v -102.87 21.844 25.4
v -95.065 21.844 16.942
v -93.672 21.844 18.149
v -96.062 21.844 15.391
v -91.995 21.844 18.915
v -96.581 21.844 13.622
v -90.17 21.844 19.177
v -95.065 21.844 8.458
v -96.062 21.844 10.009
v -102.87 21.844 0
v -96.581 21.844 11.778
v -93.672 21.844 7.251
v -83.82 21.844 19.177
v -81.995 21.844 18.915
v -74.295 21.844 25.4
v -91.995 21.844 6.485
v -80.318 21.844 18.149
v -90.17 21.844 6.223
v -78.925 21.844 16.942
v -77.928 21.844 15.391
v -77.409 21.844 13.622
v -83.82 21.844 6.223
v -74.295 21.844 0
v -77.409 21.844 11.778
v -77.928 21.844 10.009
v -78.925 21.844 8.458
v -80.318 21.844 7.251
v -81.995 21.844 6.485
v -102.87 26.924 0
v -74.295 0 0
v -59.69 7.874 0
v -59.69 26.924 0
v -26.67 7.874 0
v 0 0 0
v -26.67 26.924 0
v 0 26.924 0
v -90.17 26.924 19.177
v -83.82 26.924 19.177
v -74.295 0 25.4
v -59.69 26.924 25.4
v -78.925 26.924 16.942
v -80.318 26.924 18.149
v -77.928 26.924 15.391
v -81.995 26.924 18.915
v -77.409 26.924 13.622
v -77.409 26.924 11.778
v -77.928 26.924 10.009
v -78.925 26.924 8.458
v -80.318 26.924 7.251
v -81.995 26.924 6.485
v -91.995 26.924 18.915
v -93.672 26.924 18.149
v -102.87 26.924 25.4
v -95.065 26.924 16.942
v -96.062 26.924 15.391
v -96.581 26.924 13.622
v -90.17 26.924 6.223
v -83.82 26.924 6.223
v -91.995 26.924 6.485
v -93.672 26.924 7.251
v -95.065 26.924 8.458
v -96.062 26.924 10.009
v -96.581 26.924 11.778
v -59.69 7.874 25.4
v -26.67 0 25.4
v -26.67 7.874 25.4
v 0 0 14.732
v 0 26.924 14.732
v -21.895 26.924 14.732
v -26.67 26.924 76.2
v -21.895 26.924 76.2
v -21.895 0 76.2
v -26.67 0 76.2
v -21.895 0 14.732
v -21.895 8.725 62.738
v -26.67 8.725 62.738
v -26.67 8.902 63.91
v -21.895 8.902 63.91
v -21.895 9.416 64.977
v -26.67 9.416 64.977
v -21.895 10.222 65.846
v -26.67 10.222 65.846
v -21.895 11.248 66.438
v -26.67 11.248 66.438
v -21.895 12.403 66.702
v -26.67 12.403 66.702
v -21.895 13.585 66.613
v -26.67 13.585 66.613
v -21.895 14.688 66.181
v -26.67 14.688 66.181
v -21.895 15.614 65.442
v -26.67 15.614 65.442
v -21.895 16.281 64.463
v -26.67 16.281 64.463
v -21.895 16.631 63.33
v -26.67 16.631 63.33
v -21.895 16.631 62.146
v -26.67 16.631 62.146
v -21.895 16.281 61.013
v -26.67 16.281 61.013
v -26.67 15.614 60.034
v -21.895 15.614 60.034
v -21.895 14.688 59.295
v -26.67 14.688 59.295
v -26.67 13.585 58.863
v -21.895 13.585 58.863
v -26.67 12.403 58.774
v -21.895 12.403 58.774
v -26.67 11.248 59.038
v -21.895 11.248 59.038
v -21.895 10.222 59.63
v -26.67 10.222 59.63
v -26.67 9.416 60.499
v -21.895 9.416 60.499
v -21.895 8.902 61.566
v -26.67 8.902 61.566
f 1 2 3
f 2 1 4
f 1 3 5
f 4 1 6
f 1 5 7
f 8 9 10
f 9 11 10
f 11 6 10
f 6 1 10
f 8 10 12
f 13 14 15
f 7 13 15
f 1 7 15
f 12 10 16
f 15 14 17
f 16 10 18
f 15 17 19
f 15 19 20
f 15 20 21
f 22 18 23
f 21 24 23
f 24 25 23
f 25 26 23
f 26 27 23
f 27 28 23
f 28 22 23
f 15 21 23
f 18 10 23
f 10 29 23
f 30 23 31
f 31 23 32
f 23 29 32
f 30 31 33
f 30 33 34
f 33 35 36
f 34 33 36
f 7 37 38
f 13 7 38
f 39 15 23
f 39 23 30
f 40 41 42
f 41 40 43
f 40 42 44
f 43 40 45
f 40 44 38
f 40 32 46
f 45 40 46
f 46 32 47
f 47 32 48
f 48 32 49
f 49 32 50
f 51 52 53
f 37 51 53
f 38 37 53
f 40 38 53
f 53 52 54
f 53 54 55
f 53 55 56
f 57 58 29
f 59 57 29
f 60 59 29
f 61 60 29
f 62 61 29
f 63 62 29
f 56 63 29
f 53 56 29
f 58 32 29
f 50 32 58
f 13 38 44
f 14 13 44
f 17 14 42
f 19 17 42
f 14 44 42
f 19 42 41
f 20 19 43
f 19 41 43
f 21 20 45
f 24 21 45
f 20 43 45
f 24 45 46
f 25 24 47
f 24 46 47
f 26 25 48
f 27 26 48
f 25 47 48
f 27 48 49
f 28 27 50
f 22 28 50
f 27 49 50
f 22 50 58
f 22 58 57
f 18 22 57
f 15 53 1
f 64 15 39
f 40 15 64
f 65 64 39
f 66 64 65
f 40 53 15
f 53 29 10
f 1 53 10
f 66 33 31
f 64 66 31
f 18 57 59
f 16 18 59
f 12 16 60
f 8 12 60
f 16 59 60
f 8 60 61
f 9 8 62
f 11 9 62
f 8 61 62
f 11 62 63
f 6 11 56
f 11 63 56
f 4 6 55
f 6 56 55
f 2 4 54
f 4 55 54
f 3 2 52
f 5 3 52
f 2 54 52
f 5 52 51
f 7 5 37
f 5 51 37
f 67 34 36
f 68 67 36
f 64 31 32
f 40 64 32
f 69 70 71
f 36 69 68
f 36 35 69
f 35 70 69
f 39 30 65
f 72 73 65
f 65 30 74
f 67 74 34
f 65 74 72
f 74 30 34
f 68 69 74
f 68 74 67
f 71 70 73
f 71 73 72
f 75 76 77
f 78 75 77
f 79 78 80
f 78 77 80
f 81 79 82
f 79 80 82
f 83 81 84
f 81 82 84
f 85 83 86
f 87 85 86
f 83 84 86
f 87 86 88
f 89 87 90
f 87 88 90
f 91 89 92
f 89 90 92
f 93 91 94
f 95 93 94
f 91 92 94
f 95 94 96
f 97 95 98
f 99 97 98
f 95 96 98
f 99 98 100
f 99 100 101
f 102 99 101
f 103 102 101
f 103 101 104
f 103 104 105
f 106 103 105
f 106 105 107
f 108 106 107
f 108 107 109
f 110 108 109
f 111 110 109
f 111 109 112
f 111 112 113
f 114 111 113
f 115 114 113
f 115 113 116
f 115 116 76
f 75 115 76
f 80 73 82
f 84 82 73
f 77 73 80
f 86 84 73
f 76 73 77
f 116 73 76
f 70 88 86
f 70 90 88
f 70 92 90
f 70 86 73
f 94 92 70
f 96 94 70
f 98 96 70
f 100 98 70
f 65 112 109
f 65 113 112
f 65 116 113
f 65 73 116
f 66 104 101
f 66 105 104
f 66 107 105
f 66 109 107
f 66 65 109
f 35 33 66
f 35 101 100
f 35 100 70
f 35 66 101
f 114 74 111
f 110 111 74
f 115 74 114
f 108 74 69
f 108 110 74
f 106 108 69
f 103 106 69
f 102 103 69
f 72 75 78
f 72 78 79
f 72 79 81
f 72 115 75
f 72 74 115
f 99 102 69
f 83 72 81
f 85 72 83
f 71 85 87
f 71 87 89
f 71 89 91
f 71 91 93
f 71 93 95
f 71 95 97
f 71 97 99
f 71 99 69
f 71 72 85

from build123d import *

# Parameters (mm, degrees)
F1_DEPTH  = 25.4
F3_DEPTH  = 127
F4_W      = 4.7752
F4_H      = 26.924
F5_DEPTH  = 50.8
F6_R      = 3.9751
F7_DEPTH  = 25.4
F8_W      = 26.924
F8_H      = 57.4802
F9_DEPTH  = 25.4
F10_W     = 21.8948
F10_H     = 26.924
F11_DEPTH = 3.9878


with BuildPart() as f1:
    # F0 (on Top) → F1 (new body)
    with BuildSketch(Plane.XY):
        Polygon((-74.295, 0), (0, 0), (0, 26.924), (-26.67, 26.924), (-26.67, 7.874), (-59.69, 7.874), (-59.69, 26.924), (-102.87, 26.924), (-102.87, 21.844), (-74.295, 21.844), align=None)
    extrude(amount=F1_DEPTH)

    # F2 (on face) → F3 (cut)
    with BuildSketch(Plane(origin=(0, 26.924, 0), x_dir=(-1, 0, 0), z_dir=(0, 1, 0))):
        with BuildLine():
            Line((90.17, 19.177), (90.17, 6.223))
            ThreePointArc((90.17, 6.223), (96.647, 12.7), (90.17, 19.177))
        make_face()
        with BuildLine():
            Line((83.82, 6.223), (90.17, 6.223))
            Line((90.17, 6.223), (90.17, 19.177))
            Line((90.17, 19.177), (83.82, 19.177))
            ThreePointArc((83.82, 19.177), (77.343, 12.7), (83.82, 6.223))
        make_face()
    extrude(amount=-F3_DEPTH, mode=Mode.SUBTRACT)

    # F4 (on face) → F5 (join)
    with BuildSketch(Plane.XY.offset(25.4)):
        with Locations((-24.2824, 13.462)):
            Rectangle(F4_W, F4_H)
    extrude(amount=F5_DEPTH)

    # F6 (on face) → F7 (cut)
    with BuildSketch(Plane(origin=(-26.67, 0, 0), x_dir=(0, -1, 0), z_dir=(-1, 0, 0))):
        with Locations((-12.7, 62.738)):
            Circle(F6_R)
    extrude(amount=-F7_DEPTH, mode=Mode.SUBTRACT)

    # F8 (on face) → F9 (cut)
    with BuildSketch(Plane.YZ.offset(-21.8948)):
        with Locations((13.462, 47.4599)):
            Rectangle(F8_W, F8_H)
    extrude(amount=F9_DEPTH, mode=Mode.SUBTRACT)

    # F10 (on face) → F11 (cut)
    with BuildSketch(Plane.XY.offset(18.7198)):
        with Locations((-10.9474, 13.462)):
            Rectangle(F10_W, F10_H)
    extrude(amount=-F11_DEPTH, mode=Mode.SUBTRACT)


solid = f1.part
